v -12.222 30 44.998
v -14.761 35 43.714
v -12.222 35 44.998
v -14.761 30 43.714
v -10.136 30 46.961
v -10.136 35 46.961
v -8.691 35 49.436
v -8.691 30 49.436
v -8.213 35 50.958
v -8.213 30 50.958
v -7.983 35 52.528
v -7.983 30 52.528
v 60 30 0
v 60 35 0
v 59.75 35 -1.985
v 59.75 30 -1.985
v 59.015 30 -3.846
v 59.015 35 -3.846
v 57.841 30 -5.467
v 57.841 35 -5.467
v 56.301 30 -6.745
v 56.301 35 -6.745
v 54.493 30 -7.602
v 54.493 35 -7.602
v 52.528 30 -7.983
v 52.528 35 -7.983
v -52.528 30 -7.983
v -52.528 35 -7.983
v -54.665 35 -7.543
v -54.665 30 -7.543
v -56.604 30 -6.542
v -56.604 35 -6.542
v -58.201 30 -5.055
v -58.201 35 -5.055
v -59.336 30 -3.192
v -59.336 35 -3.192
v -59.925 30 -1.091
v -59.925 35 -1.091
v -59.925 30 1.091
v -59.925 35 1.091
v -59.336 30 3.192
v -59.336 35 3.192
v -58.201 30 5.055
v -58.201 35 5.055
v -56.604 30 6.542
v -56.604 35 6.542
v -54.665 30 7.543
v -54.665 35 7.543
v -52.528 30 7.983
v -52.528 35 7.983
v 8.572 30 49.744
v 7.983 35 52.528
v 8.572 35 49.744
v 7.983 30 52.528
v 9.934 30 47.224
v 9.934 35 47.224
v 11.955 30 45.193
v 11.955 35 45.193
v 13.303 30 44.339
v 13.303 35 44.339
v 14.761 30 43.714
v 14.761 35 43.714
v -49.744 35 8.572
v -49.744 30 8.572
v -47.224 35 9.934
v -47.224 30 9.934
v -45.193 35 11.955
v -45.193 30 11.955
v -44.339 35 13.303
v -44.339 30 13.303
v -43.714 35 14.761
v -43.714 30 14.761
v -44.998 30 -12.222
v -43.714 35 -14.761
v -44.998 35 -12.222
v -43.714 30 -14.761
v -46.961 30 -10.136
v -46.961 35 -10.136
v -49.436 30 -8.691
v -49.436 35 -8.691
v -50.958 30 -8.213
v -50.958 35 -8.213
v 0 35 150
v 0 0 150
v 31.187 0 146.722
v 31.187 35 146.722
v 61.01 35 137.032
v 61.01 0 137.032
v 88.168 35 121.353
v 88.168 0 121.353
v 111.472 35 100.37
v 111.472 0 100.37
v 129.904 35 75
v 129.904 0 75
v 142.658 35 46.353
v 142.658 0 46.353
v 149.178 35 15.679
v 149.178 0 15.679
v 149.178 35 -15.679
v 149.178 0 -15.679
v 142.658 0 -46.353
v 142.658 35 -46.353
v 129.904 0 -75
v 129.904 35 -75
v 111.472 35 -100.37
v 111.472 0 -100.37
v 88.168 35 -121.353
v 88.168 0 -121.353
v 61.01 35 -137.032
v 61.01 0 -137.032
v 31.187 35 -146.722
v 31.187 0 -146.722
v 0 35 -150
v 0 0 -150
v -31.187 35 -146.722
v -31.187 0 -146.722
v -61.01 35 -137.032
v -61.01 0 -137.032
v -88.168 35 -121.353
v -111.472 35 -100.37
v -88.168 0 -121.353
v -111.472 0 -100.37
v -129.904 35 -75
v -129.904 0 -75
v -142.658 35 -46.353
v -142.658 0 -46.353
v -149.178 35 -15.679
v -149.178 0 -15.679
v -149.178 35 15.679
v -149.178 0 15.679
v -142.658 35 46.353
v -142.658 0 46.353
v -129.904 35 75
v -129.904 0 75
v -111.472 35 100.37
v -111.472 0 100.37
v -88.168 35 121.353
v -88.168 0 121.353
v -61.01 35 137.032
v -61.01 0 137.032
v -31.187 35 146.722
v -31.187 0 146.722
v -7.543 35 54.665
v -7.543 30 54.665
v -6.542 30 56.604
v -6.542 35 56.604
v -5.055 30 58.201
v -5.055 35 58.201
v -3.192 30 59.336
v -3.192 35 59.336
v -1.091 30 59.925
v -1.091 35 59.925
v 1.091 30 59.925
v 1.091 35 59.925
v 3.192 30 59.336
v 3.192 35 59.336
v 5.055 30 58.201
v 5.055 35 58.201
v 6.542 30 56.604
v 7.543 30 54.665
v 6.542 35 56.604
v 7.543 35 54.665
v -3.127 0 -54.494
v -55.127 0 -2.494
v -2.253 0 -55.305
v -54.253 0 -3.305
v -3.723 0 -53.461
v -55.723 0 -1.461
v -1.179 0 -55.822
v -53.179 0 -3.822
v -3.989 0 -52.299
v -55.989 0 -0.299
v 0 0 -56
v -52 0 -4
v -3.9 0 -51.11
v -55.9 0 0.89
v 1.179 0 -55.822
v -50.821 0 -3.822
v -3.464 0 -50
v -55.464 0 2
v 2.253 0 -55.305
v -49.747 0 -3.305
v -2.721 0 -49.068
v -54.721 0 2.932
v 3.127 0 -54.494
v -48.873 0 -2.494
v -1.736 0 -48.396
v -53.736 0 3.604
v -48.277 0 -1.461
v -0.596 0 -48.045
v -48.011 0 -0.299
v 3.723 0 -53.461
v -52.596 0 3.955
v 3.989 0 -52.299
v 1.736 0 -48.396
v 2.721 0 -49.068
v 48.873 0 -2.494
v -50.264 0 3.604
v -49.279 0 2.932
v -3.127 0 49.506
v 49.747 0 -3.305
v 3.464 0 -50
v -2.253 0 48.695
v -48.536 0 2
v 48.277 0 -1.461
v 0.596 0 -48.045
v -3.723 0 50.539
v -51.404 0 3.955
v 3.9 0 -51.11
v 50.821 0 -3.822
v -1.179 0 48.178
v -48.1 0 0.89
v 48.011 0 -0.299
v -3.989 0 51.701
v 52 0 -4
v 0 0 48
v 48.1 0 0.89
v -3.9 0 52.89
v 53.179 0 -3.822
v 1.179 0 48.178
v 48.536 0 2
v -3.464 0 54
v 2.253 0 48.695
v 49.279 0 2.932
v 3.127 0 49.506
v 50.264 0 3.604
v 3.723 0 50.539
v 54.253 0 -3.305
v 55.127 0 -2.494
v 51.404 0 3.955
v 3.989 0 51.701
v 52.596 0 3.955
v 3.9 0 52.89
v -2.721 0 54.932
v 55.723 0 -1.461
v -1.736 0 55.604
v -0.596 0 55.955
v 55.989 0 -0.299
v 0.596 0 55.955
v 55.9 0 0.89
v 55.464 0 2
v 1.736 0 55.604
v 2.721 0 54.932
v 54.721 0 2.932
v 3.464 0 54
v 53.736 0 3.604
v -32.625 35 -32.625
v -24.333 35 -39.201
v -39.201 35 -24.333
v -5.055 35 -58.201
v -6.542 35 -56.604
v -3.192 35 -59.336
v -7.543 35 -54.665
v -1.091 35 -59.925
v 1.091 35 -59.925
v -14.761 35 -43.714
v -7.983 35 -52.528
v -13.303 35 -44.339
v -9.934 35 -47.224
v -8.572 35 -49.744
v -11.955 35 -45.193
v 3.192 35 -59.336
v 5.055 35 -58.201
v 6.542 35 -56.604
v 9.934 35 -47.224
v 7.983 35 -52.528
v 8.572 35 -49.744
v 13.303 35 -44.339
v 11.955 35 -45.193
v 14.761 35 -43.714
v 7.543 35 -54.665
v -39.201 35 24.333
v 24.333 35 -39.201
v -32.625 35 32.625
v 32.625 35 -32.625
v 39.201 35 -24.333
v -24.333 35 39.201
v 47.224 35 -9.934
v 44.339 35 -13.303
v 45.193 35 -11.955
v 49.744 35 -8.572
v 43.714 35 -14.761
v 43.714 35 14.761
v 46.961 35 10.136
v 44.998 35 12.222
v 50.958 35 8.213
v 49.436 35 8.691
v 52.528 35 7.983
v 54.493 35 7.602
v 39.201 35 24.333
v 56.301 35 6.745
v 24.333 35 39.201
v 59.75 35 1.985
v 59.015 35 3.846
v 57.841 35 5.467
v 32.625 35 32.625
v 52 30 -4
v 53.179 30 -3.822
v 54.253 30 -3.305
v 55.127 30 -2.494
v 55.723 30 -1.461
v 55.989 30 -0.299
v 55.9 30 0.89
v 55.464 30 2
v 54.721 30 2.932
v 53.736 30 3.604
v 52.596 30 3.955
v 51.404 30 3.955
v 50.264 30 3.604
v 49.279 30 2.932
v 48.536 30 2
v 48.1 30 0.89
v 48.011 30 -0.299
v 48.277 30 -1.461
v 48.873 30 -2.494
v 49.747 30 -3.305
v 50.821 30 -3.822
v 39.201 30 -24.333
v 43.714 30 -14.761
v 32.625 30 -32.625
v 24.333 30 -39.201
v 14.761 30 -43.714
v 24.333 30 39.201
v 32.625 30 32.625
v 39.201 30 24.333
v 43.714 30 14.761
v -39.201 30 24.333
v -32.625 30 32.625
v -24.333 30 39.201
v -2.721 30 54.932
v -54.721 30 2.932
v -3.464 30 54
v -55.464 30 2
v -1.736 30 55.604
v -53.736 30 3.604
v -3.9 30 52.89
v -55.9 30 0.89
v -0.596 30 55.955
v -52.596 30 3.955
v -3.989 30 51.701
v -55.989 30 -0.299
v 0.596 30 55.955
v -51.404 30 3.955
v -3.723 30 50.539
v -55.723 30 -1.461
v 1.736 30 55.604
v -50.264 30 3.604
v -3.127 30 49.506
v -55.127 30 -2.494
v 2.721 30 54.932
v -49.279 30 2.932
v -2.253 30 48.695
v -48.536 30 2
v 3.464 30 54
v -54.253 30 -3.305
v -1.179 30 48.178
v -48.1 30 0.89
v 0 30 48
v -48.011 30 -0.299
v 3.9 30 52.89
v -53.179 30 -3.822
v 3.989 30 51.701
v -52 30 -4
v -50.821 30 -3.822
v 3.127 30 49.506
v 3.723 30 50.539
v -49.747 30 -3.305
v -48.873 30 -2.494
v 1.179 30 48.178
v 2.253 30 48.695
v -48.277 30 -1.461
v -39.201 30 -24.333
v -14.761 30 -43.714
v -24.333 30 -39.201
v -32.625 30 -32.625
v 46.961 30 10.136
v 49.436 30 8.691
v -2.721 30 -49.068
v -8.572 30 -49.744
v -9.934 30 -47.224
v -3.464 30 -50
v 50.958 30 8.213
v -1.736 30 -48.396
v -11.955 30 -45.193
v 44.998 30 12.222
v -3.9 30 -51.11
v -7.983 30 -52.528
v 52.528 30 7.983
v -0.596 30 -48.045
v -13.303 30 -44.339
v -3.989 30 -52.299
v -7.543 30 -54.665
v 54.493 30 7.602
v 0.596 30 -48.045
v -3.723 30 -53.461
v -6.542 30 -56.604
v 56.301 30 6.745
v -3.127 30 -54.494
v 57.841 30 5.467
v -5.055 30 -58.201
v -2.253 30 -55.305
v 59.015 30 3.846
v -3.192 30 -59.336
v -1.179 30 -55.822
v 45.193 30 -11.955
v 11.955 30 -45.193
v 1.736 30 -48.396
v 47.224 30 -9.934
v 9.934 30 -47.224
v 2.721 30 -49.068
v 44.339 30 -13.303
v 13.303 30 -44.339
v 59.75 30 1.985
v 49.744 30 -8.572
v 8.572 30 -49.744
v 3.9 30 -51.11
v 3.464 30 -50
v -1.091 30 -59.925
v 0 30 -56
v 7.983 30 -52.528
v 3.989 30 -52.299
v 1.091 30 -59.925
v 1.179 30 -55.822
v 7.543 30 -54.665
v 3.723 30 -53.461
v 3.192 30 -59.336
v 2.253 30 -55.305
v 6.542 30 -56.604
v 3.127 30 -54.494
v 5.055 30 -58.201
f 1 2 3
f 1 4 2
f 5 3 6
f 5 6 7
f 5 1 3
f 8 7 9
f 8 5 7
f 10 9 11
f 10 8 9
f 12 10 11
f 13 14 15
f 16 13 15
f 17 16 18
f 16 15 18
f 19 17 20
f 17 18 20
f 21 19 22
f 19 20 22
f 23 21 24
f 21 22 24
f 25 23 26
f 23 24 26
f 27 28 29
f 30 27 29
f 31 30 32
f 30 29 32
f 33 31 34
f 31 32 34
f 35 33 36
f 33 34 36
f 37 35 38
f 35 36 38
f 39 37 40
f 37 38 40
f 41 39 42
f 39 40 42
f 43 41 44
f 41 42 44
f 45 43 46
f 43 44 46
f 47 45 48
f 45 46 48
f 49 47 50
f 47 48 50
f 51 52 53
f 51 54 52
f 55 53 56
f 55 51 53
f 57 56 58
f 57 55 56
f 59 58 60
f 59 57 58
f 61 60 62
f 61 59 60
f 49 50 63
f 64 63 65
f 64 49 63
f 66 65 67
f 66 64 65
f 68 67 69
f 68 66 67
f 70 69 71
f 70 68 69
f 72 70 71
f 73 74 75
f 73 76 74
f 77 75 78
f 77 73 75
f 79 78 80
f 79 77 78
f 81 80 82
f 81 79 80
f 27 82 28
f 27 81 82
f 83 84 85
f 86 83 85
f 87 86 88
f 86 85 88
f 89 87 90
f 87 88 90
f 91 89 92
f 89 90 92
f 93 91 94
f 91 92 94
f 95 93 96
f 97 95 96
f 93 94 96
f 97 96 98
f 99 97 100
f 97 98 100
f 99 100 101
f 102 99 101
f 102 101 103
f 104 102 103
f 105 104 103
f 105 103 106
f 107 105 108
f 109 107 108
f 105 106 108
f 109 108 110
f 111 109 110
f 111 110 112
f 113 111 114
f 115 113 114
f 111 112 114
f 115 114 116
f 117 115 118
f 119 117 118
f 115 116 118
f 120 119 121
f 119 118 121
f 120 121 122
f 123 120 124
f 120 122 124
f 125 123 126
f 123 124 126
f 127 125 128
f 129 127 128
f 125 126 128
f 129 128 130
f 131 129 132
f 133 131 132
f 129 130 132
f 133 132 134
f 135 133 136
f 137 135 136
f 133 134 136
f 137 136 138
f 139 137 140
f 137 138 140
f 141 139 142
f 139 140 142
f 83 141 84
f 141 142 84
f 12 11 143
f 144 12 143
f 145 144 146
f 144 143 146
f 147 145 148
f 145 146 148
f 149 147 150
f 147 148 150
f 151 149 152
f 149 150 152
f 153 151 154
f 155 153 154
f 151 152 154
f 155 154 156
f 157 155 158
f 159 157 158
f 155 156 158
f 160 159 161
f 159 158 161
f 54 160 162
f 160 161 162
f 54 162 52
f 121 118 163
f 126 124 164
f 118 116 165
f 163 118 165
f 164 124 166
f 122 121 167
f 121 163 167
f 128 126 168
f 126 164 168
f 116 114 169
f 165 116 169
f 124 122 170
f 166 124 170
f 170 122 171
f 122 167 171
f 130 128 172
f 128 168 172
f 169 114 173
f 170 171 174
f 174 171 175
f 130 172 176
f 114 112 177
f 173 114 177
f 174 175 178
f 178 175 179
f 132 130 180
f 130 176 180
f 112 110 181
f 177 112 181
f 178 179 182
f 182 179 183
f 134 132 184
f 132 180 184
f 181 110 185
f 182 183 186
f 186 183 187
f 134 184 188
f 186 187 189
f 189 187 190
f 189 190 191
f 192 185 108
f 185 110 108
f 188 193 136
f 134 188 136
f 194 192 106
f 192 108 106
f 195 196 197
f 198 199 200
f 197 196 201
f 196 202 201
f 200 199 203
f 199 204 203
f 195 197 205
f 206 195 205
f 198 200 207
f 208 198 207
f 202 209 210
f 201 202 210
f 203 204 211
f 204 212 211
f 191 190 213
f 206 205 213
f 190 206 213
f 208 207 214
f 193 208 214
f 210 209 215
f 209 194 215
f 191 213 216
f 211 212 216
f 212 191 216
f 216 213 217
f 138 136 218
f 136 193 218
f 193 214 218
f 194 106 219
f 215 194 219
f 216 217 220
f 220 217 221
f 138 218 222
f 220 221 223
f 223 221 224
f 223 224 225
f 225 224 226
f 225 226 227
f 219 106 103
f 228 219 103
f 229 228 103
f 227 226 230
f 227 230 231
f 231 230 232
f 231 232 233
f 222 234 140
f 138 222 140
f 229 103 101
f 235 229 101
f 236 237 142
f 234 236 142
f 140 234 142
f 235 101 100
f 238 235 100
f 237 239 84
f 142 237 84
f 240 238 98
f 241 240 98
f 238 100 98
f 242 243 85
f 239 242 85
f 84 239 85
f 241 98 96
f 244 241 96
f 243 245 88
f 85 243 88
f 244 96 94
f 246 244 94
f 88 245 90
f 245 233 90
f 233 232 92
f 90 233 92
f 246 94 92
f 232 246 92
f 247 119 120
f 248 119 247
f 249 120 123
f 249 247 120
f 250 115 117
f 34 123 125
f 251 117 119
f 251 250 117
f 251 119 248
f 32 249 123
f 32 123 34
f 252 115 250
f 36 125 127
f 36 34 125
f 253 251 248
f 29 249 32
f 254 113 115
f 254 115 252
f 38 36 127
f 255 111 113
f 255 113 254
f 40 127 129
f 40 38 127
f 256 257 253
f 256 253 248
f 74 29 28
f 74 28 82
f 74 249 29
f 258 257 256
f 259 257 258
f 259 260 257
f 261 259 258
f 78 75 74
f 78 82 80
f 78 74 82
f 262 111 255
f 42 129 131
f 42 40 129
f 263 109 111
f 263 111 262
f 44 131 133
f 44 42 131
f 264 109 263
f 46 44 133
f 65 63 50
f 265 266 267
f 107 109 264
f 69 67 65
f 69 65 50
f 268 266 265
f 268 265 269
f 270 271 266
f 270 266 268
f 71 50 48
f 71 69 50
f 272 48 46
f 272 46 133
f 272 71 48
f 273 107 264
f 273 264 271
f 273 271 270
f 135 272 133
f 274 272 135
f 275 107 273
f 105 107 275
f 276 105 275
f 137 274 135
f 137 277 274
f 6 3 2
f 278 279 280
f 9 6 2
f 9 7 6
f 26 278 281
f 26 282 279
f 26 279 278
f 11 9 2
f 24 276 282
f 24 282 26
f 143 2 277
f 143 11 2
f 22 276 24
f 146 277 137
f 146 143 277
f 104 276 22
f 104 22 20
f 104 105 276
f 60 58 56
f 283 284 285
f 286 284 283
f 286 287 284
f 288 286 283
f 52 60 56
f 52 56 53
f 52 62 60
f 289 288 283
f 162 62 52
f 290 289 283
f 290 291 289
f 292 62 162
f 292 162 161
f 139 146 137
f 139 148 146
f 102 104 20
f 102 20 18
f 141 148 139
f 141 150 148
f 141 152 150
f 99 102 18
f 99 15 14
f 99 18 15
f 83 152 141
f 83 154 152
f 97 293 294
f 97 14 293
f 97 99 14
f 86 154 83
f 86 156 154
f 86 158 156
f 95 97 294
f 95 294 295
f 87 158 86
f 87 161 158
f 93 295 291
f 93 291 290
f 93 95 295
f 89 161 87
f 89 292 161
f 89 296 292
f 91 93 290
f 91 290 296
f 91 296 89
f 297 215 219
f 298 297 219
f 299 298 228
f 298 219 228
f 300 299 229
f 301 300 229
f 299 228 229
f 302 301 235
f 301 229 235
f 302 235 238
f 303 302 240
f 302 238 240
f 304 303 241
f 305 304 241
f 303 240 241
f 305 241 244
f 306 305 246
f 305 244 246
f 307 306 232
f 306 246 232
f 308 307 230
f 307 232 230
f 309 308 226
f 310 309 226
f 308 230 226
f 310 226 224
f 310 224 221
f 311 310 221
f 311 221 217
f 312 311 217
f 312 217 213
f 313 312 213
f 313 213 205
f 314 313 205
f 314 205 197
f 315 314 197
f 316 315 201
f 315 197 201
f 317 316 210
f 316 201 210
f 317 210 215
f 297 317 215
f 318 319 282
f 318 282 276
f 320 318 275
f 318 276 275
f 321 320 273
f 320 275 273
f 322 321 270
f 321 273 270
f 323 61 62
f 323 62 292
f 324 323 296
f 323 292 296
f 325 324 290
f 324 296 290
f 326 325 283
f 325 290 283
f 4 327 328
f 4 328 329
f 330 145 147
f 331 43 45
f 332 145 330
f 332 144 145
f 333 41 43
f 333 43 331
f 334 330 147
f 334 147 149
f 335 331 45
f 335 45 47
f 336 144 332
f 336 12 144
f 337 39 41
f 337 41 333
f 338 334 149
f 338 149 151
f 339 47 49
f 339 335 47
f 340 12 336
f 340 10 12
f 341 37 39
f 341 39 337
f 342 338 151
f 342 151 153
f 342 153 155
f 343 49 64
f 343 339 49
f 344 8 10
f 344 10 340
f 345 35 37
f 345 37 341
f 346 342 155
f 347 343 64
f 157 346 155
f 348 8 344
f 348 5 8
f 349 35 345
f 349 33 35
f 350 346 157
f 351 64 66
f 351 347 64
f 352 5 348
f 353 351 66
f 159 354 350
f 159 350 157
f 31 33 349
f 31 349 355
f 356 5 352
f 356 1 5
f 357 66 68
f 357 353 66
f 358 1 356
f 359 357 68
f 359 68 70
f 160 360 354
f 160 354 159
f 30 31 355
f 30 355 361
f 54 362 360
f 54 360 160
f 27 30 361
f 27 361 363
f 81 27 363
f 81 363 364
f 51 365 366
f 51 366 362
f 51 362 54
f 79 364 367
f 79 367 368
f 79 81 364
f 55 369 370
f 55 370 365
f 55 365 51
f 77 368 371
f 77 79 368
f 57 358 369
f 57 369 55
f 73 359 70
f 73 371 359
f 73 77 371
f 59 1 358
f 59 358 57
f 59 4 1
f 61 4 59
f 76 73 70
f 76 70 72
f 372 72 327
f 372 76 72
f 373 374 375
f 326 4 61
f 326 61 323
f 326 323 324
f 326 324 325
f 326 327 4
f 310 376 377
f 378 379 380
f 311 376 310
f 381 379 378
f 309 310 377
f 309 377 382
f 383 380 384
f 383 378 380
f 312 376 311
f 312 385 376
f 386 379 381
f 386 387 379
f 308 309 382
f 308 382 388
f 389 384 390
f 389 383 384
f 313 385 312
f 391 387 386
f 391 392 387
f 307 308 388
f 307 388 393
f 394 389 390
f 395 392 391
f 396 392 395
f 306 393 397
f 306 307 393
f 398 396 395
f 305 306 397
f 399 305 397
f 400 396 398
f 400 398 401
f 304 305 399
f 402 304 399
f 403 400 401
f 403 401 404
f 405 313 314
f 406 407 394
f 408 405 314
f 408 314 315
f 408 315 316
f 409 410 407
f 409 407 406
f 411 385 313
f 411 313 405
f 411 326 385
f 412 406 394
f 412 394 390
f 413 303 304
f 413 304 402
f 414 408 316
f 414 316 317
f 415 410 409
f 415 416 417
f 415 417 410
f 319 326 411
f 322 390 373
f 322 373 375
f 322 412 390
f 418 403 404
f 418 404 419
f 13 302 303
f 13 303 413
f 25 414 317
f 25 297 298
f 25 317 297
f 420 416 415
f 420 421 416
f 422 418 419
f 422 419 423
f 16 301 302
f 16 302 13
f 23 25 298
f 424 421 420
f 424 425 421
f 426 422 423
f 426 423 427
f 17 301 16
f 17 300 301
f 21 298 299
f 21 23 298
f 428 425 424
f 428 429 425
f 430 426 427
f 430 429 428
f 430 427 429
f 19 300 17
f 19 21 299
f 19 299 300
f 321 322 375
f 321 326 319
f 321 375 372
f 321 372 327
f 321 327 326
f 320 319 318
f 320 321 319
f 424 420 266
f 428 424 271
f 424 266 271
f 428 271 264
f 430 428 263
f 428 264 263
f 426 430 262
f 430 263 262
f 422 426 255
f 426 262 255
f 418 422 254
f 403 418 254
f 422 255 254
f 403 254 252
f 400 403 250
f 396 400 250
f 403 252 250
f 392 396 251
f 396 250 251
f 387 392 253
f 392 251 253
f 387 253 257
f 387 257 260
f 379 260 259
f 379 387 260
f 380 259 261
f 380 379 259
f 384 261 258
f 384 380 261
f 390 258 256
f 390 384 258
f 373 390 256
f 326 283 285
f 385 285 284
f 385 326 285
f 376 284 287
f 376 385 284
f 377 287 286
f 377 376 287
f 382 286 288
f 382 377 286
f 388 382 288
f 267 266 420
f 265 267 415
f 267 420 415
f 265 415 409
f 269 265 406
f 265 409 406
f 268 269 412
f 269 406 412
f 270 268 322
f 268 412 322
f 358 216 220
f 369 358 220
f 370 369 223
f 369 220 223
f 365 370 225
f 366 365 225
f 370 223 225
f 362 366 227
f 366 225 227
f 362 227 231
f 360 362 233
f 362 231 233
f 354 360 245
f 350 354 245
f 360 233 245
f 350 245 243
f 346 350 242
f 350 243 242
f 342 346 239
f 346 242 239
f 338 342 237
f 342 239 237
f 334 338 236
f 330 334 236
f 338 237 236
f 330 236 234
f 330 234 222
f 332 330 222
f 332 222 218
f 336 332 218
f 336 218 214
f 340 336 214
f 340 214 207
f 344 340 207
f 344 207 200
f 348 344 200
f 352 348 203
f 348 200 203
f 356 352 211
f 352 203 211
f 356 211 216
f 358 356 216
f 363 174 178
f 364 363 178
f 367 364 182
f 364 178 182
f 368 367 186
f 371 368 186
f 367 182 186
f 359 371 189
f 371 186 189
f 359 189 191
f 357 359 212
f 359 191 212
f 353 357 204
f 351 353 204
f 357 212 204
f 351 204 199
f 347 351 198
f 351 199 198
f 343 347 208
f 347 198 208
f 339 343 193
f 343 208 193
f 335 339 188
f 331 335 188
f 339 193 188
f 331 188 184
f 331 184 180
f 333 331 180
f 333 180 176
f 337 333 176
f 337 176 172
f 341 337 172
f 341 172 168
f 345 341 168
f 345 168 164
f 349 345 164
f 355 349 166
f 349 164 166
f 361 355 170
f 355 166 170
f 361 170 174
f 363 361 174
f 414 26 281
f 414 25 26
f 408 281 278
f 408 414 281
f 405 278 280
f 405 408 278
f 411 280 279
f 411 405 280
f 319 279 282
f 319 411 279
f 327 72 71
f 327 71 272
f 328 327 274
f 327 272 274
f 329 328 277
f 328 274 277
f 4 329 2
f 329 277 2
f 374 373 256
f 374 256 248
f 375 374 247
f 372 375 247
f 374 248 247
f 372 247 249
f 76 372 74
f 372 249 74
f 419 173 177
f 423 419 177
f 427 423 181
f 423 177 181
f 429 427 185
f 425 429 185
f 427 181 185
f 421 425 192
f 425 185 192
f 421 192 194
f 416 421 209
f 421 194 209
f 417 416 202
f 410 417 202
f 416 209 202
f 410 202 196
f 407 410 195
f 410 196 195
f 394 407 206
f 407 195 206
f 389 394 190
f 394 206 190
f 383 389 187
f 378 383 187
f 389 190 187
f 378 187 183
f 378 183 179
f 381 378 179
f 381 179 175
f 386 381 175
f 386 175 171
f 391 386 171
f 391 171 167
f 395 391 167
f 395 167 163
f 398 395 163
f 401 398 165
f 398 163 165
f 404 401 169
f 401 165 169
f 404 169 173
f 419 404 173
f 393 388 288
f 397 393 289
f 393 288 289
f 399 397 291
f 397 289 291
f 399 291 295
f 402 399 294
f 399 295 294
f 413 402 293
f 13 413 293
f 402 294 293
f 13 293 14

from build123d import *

# Parameters (mm, degrees)
SKETCH1_R           = 150
BOSS_EXTRUDE1_DEPTH = 35
SKETCH2_R           = 4
CUT_EXTRUDE1_DEPTH  = 30
SKETCH3_R           = 8
SKETCH3_R_2         = 46.138899257
CUT_EXTRUDE2_DEPTH  = 5
FILLET1_R           = 10


with BuildPart() as part:
    # Sketch1 → Boss-Extrude1 (new body)
    with BuildSketch(Plane(origin=(0, 0, 0), x_dir=(1, 0, 0), z_dir=(0, 1, 0))):
        with Locations(Location((0, 0, 0), (0, 0, 270))):
            Circle(SKETCH1_R)
    extrude(amount=BOSS_EXTRUDE1_DEPTH)

    # Sketch2 → Cut-Extrude1 (cut)
    with BuildSketch(Plane.XZ):
        with Locations(Location((0, 52, 0), (0, 0, 270))):
            Circle(SKETCH2_R)
        with Locations(Location((-52, 0, 0), (0, 0, 270))):
            Circle(SKETCH2_R)
        with Locations(Location((52, 0, 0), (0, 0, 270))):
            Circle(SKETCH2_R)
        with Locations(Location((0, -52, 0), (0, 0, 270))):
            Circle(SKETCH2_R)
    extrude(amount=-CUT_EXTRUDE1_DEPTH, mode=Mode.SUBTRACT)

    # Sketch3 → Cut-Extrude2 (cut)
    with BuildSketch(Plane(origin=(0, 35, 0), x_dir=(1, 0, 0), z_dir=(0, 1, 0))):
        with BuildLine():
            ThreePointArc((-52, 8), (-60, 0), (-52, -8))
            ThreePointArc((-52, -8), (-48.606472063, -7.244581985), (-45.85382716, -5.120992035))
            ThreePointArc((-45.85382716, -5.120992035), (-46.138899257, 0), (-45.85382716, 5.120992035))
            ThreePointArc((-45.85382716, 5.120992035), (-48.606472063, 7.244581985), (-52, 8))
        make_face()
        with BuildLine():
            Line((-52, -8), (-45.440048687, -8))
            ThreePointArc((-45.440048687, -8), (-45.669630101, -6.563757396), (-45.85382716, -5.120992035))
            ThreePointArc((-45.85382716, -5.120992035), (-48.606472063, -7.244581985), (-52, -8))
        make_face()
        with BuildLine():
            Line((-45.440048687, 8), (-52, 8))
            ThreePointArc((-52, 8), (-48.606472063, 7.244581985), (-45.85382716, 5.120992035))
            ThreePointArc((-45.85382716, 5.120992035), (-45.669630101, 6.563757396), (-45.440048687, 8))
        make_face()
        with Locations((0, 52)):
            Circle(SKETCH3_R)
        Circle(SKETCH3_R_2)
        with Locations((-52, 0)):
            Circle(SKETCH3_R)
        with Locations((0, -52)):
            Circle(SKETCH3_R)
        with Locations((52, 0)):
            Circle(SKETCH3_R)
        with BuildLine():
            ThreePointArc((5.120992035, 45.85382716), (7.244581985, 48.606472063), (8, 52))
            ThreePointArc((8, 52), (0, 60), (-8, 52))
            ThreePointArc((-8, 52), (-7.244581985, 48.606472063), (-5.120992035, 45.85382716))
            ThreePointArc((-5.120992035, 45.85382716), (0, 46.138899257), (5.120992035, 45.85382716))
        make_face()
        with BuildLine():
            ThreePointArc((5.120992035, 45.85382716), (6.563757396, 45.669630101), (8, 45.440048687))
            Line((8, 45.440048687), (8, 52))
            ThreePointArc((8, 52), (7.244581985, 48.606472063), (5.120992035, 45.85382716))
        make_face()
        with BuildLine():
            ThreePointArc((-5.120992035, 45.85382716), (-7.244581985, 48.606472063), (-8, 52))
            Line((-8, 52), (-8, 45.440048687))
            ThreePointArc((-8, 45.440048687), (-6.563757396, 45.669630101), (-5.120992035, 45.85382716))
        make_face()
        with BuildLine():
            ThreePointArc((45.85382716, -5.120992035), (48.606472063, -7.244581985), (52, -8))
            ThreePointArc((52, -8), (57.656854249, -5.656854249), (60, 0))
            ThreePointArc((60, 0), (57.656854249, 5.656854249), (52, 8))
            ThreePointArc((52, 8), (48.606472063, 7.244581985), (45.85382716, 5.120992035))
            ThreePointArc((45.85382716, 5.120992035), (46.067576106, 2.564460252), (46.138899257, 0))
            ThreePointArc((46.138899257, 0), (46.067576106, -2.564460252), (45.85382716, -5.120992035))
        make_face()
        with BuildLine():
            Line((45.440048687, -8), (52, -8))
            ThreePointArc((52, -8), (48.606472063, -7.244581985), (45.85382716, -5.120992035))
            ThreePointArc((45.85382716, -5.120992035), (45.669630101, -6.563757396), (45.440048687, -8))
        make_face()
        with BuildLine():
            ThreePointArc((45.85382716, 5.120992035), (48.606472063, 7.244581985), (52, 8))
            Line((52, 8), (45.440048687, 8))
            ThreePointArc((45.440048687, 8), (45.669630101, 6.563757396), (45.85382716, 5.120992035))
        make_face()
        with BuildLine():
            ThreePointArc((-8, -52), (0, -60), (8, -52))
            ThreePointArc((8, -52), (7.244581985, -48.606472063), (5.120992035, -45.85382716))
            ThreePointArc((5.120992035, -45.85382716), (0, -46.138899257), (-5.120992035, -45.85382716))
            ThreePointArc((-5.120992035, -45.85382716), (-7.244581985, -48.606472063), (-8, -52))
        make_face()
        with BuildLine():
            Line((-8, -45.440048687), (-8, -52))
            ThreePointArc((-8, -52), (-7.244581985, -48.606472063), (-5.120992035, -45.85382716))
            ThreePointArc((-5.120992035, -45.85382716), (-6.563757396, -45.669630101), (-8, -45.440048687))
        make_face()
        with BuildLine():
            Line((8, -52), (8, -45.440048687))
            ThreePointArc((8, -45.440048687), (6.563757396, -45.669630101), (5.120992035, -45.85382716))
            ThreePointArc((5.120992035, -45.85382716), (7.244581985, -48.606472063), (8, -52))
        make_face()
    extrude(amount=-CUT_EXTRUDE2_DEPTH, mode=Mode.SUBTRACT)

    # Fillet1
    fillet1_edges = [part.edges().sort_by_distance(p)[0] for p in [
        (-45.440048687, 32.5, 8),
        (-8, 32.5, 45.440048687),
        (8, 32.5, 45.440048687),
        (45.440048687, 32.5, 8),
        (45.440048687, 32.5, -8),
        (8, 32.5, -45.440048687),
        (-8, 32.5, -45.440048687),
        (-45.440048687, 32.5, -8),
    ]]
    fillet(fillet1_edges, radius=FILLET1_R)


solid = part.part
